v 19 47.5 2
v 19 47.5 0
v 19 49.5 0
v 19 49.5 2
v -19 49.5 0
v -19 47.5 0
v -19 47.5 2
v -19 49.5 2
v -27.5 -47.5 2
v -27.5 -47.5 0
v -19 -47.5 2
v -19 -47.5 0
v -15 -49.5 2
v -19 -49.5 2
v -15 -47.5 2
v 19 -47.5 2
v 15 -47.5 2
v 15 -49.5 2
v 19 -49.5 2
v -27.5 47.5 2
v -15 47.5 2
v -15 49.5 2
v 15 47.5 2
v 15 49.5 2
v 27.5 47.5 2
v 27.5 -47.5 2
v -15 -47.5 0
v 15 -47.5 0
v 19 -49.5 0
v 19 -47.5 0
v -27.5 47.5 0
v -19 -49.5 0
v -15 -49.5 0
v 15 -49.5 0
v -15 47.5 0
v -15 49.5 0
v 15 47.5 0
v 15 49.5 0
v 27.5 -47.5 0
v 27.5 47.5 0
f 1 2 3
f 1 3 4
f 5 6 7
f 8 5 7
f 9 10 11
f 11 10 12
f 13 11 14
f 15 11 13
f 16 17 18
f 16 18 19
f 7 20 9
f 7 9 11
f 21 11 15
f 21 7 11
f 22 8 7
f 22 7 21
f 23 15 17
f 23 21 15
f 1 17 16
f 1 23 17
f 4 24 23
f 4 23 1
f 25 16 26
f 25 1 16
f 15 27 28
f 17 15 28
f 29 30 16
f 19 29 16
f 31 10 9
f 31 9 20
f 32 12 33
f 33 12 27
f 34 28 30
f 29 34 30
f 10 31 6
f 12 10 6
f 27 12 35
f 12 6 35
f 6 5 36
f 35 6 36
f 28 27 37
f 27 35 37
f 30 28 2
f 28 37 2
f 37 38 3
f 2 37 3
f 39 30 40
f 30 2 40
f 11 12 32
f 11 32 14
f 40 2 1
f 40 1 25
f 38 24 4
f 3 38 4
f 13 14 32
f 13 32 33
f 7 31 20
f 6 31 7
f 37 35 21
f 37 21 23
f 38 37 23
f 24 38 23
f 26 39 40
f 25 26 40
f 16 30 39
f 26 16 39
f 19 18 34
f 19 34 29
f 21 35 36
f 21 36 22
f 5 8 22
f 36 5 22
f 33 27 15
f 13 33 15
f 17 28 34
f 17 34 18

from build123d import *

# Parameters (mm, degrees)
F0_W     = 55
F0_H     = 95
F1_DEPTH = 2
F2_W     = 4
F2_H     = 2
F3_DEPTH = 2


with BuildPart() as f1:
    # F0 (on Top) → F1 (new body)
    with BuildSketch(Plane.XY):
        Rectangle(F0_W, F0_H)
    extrude(amount=F1_DEPTH)

    # F2 (on face) → F3 (join)
    with BuildSketch(Plane.XZ.offset(47.5)):
        with Locations((17, 1)):
            Rectangle(F2_W, F2_H)
        with Locations((-17, 1)):
            Rectangle(F2_W, F2_H)
    extrude(amount=F3_DEPTH)

    # F4: F1 across plane


with BuildPart() as f1_1:
    add(f1.part)
    add(f1.part.mirror(Plane.XZ))


solid = f1_1.part
